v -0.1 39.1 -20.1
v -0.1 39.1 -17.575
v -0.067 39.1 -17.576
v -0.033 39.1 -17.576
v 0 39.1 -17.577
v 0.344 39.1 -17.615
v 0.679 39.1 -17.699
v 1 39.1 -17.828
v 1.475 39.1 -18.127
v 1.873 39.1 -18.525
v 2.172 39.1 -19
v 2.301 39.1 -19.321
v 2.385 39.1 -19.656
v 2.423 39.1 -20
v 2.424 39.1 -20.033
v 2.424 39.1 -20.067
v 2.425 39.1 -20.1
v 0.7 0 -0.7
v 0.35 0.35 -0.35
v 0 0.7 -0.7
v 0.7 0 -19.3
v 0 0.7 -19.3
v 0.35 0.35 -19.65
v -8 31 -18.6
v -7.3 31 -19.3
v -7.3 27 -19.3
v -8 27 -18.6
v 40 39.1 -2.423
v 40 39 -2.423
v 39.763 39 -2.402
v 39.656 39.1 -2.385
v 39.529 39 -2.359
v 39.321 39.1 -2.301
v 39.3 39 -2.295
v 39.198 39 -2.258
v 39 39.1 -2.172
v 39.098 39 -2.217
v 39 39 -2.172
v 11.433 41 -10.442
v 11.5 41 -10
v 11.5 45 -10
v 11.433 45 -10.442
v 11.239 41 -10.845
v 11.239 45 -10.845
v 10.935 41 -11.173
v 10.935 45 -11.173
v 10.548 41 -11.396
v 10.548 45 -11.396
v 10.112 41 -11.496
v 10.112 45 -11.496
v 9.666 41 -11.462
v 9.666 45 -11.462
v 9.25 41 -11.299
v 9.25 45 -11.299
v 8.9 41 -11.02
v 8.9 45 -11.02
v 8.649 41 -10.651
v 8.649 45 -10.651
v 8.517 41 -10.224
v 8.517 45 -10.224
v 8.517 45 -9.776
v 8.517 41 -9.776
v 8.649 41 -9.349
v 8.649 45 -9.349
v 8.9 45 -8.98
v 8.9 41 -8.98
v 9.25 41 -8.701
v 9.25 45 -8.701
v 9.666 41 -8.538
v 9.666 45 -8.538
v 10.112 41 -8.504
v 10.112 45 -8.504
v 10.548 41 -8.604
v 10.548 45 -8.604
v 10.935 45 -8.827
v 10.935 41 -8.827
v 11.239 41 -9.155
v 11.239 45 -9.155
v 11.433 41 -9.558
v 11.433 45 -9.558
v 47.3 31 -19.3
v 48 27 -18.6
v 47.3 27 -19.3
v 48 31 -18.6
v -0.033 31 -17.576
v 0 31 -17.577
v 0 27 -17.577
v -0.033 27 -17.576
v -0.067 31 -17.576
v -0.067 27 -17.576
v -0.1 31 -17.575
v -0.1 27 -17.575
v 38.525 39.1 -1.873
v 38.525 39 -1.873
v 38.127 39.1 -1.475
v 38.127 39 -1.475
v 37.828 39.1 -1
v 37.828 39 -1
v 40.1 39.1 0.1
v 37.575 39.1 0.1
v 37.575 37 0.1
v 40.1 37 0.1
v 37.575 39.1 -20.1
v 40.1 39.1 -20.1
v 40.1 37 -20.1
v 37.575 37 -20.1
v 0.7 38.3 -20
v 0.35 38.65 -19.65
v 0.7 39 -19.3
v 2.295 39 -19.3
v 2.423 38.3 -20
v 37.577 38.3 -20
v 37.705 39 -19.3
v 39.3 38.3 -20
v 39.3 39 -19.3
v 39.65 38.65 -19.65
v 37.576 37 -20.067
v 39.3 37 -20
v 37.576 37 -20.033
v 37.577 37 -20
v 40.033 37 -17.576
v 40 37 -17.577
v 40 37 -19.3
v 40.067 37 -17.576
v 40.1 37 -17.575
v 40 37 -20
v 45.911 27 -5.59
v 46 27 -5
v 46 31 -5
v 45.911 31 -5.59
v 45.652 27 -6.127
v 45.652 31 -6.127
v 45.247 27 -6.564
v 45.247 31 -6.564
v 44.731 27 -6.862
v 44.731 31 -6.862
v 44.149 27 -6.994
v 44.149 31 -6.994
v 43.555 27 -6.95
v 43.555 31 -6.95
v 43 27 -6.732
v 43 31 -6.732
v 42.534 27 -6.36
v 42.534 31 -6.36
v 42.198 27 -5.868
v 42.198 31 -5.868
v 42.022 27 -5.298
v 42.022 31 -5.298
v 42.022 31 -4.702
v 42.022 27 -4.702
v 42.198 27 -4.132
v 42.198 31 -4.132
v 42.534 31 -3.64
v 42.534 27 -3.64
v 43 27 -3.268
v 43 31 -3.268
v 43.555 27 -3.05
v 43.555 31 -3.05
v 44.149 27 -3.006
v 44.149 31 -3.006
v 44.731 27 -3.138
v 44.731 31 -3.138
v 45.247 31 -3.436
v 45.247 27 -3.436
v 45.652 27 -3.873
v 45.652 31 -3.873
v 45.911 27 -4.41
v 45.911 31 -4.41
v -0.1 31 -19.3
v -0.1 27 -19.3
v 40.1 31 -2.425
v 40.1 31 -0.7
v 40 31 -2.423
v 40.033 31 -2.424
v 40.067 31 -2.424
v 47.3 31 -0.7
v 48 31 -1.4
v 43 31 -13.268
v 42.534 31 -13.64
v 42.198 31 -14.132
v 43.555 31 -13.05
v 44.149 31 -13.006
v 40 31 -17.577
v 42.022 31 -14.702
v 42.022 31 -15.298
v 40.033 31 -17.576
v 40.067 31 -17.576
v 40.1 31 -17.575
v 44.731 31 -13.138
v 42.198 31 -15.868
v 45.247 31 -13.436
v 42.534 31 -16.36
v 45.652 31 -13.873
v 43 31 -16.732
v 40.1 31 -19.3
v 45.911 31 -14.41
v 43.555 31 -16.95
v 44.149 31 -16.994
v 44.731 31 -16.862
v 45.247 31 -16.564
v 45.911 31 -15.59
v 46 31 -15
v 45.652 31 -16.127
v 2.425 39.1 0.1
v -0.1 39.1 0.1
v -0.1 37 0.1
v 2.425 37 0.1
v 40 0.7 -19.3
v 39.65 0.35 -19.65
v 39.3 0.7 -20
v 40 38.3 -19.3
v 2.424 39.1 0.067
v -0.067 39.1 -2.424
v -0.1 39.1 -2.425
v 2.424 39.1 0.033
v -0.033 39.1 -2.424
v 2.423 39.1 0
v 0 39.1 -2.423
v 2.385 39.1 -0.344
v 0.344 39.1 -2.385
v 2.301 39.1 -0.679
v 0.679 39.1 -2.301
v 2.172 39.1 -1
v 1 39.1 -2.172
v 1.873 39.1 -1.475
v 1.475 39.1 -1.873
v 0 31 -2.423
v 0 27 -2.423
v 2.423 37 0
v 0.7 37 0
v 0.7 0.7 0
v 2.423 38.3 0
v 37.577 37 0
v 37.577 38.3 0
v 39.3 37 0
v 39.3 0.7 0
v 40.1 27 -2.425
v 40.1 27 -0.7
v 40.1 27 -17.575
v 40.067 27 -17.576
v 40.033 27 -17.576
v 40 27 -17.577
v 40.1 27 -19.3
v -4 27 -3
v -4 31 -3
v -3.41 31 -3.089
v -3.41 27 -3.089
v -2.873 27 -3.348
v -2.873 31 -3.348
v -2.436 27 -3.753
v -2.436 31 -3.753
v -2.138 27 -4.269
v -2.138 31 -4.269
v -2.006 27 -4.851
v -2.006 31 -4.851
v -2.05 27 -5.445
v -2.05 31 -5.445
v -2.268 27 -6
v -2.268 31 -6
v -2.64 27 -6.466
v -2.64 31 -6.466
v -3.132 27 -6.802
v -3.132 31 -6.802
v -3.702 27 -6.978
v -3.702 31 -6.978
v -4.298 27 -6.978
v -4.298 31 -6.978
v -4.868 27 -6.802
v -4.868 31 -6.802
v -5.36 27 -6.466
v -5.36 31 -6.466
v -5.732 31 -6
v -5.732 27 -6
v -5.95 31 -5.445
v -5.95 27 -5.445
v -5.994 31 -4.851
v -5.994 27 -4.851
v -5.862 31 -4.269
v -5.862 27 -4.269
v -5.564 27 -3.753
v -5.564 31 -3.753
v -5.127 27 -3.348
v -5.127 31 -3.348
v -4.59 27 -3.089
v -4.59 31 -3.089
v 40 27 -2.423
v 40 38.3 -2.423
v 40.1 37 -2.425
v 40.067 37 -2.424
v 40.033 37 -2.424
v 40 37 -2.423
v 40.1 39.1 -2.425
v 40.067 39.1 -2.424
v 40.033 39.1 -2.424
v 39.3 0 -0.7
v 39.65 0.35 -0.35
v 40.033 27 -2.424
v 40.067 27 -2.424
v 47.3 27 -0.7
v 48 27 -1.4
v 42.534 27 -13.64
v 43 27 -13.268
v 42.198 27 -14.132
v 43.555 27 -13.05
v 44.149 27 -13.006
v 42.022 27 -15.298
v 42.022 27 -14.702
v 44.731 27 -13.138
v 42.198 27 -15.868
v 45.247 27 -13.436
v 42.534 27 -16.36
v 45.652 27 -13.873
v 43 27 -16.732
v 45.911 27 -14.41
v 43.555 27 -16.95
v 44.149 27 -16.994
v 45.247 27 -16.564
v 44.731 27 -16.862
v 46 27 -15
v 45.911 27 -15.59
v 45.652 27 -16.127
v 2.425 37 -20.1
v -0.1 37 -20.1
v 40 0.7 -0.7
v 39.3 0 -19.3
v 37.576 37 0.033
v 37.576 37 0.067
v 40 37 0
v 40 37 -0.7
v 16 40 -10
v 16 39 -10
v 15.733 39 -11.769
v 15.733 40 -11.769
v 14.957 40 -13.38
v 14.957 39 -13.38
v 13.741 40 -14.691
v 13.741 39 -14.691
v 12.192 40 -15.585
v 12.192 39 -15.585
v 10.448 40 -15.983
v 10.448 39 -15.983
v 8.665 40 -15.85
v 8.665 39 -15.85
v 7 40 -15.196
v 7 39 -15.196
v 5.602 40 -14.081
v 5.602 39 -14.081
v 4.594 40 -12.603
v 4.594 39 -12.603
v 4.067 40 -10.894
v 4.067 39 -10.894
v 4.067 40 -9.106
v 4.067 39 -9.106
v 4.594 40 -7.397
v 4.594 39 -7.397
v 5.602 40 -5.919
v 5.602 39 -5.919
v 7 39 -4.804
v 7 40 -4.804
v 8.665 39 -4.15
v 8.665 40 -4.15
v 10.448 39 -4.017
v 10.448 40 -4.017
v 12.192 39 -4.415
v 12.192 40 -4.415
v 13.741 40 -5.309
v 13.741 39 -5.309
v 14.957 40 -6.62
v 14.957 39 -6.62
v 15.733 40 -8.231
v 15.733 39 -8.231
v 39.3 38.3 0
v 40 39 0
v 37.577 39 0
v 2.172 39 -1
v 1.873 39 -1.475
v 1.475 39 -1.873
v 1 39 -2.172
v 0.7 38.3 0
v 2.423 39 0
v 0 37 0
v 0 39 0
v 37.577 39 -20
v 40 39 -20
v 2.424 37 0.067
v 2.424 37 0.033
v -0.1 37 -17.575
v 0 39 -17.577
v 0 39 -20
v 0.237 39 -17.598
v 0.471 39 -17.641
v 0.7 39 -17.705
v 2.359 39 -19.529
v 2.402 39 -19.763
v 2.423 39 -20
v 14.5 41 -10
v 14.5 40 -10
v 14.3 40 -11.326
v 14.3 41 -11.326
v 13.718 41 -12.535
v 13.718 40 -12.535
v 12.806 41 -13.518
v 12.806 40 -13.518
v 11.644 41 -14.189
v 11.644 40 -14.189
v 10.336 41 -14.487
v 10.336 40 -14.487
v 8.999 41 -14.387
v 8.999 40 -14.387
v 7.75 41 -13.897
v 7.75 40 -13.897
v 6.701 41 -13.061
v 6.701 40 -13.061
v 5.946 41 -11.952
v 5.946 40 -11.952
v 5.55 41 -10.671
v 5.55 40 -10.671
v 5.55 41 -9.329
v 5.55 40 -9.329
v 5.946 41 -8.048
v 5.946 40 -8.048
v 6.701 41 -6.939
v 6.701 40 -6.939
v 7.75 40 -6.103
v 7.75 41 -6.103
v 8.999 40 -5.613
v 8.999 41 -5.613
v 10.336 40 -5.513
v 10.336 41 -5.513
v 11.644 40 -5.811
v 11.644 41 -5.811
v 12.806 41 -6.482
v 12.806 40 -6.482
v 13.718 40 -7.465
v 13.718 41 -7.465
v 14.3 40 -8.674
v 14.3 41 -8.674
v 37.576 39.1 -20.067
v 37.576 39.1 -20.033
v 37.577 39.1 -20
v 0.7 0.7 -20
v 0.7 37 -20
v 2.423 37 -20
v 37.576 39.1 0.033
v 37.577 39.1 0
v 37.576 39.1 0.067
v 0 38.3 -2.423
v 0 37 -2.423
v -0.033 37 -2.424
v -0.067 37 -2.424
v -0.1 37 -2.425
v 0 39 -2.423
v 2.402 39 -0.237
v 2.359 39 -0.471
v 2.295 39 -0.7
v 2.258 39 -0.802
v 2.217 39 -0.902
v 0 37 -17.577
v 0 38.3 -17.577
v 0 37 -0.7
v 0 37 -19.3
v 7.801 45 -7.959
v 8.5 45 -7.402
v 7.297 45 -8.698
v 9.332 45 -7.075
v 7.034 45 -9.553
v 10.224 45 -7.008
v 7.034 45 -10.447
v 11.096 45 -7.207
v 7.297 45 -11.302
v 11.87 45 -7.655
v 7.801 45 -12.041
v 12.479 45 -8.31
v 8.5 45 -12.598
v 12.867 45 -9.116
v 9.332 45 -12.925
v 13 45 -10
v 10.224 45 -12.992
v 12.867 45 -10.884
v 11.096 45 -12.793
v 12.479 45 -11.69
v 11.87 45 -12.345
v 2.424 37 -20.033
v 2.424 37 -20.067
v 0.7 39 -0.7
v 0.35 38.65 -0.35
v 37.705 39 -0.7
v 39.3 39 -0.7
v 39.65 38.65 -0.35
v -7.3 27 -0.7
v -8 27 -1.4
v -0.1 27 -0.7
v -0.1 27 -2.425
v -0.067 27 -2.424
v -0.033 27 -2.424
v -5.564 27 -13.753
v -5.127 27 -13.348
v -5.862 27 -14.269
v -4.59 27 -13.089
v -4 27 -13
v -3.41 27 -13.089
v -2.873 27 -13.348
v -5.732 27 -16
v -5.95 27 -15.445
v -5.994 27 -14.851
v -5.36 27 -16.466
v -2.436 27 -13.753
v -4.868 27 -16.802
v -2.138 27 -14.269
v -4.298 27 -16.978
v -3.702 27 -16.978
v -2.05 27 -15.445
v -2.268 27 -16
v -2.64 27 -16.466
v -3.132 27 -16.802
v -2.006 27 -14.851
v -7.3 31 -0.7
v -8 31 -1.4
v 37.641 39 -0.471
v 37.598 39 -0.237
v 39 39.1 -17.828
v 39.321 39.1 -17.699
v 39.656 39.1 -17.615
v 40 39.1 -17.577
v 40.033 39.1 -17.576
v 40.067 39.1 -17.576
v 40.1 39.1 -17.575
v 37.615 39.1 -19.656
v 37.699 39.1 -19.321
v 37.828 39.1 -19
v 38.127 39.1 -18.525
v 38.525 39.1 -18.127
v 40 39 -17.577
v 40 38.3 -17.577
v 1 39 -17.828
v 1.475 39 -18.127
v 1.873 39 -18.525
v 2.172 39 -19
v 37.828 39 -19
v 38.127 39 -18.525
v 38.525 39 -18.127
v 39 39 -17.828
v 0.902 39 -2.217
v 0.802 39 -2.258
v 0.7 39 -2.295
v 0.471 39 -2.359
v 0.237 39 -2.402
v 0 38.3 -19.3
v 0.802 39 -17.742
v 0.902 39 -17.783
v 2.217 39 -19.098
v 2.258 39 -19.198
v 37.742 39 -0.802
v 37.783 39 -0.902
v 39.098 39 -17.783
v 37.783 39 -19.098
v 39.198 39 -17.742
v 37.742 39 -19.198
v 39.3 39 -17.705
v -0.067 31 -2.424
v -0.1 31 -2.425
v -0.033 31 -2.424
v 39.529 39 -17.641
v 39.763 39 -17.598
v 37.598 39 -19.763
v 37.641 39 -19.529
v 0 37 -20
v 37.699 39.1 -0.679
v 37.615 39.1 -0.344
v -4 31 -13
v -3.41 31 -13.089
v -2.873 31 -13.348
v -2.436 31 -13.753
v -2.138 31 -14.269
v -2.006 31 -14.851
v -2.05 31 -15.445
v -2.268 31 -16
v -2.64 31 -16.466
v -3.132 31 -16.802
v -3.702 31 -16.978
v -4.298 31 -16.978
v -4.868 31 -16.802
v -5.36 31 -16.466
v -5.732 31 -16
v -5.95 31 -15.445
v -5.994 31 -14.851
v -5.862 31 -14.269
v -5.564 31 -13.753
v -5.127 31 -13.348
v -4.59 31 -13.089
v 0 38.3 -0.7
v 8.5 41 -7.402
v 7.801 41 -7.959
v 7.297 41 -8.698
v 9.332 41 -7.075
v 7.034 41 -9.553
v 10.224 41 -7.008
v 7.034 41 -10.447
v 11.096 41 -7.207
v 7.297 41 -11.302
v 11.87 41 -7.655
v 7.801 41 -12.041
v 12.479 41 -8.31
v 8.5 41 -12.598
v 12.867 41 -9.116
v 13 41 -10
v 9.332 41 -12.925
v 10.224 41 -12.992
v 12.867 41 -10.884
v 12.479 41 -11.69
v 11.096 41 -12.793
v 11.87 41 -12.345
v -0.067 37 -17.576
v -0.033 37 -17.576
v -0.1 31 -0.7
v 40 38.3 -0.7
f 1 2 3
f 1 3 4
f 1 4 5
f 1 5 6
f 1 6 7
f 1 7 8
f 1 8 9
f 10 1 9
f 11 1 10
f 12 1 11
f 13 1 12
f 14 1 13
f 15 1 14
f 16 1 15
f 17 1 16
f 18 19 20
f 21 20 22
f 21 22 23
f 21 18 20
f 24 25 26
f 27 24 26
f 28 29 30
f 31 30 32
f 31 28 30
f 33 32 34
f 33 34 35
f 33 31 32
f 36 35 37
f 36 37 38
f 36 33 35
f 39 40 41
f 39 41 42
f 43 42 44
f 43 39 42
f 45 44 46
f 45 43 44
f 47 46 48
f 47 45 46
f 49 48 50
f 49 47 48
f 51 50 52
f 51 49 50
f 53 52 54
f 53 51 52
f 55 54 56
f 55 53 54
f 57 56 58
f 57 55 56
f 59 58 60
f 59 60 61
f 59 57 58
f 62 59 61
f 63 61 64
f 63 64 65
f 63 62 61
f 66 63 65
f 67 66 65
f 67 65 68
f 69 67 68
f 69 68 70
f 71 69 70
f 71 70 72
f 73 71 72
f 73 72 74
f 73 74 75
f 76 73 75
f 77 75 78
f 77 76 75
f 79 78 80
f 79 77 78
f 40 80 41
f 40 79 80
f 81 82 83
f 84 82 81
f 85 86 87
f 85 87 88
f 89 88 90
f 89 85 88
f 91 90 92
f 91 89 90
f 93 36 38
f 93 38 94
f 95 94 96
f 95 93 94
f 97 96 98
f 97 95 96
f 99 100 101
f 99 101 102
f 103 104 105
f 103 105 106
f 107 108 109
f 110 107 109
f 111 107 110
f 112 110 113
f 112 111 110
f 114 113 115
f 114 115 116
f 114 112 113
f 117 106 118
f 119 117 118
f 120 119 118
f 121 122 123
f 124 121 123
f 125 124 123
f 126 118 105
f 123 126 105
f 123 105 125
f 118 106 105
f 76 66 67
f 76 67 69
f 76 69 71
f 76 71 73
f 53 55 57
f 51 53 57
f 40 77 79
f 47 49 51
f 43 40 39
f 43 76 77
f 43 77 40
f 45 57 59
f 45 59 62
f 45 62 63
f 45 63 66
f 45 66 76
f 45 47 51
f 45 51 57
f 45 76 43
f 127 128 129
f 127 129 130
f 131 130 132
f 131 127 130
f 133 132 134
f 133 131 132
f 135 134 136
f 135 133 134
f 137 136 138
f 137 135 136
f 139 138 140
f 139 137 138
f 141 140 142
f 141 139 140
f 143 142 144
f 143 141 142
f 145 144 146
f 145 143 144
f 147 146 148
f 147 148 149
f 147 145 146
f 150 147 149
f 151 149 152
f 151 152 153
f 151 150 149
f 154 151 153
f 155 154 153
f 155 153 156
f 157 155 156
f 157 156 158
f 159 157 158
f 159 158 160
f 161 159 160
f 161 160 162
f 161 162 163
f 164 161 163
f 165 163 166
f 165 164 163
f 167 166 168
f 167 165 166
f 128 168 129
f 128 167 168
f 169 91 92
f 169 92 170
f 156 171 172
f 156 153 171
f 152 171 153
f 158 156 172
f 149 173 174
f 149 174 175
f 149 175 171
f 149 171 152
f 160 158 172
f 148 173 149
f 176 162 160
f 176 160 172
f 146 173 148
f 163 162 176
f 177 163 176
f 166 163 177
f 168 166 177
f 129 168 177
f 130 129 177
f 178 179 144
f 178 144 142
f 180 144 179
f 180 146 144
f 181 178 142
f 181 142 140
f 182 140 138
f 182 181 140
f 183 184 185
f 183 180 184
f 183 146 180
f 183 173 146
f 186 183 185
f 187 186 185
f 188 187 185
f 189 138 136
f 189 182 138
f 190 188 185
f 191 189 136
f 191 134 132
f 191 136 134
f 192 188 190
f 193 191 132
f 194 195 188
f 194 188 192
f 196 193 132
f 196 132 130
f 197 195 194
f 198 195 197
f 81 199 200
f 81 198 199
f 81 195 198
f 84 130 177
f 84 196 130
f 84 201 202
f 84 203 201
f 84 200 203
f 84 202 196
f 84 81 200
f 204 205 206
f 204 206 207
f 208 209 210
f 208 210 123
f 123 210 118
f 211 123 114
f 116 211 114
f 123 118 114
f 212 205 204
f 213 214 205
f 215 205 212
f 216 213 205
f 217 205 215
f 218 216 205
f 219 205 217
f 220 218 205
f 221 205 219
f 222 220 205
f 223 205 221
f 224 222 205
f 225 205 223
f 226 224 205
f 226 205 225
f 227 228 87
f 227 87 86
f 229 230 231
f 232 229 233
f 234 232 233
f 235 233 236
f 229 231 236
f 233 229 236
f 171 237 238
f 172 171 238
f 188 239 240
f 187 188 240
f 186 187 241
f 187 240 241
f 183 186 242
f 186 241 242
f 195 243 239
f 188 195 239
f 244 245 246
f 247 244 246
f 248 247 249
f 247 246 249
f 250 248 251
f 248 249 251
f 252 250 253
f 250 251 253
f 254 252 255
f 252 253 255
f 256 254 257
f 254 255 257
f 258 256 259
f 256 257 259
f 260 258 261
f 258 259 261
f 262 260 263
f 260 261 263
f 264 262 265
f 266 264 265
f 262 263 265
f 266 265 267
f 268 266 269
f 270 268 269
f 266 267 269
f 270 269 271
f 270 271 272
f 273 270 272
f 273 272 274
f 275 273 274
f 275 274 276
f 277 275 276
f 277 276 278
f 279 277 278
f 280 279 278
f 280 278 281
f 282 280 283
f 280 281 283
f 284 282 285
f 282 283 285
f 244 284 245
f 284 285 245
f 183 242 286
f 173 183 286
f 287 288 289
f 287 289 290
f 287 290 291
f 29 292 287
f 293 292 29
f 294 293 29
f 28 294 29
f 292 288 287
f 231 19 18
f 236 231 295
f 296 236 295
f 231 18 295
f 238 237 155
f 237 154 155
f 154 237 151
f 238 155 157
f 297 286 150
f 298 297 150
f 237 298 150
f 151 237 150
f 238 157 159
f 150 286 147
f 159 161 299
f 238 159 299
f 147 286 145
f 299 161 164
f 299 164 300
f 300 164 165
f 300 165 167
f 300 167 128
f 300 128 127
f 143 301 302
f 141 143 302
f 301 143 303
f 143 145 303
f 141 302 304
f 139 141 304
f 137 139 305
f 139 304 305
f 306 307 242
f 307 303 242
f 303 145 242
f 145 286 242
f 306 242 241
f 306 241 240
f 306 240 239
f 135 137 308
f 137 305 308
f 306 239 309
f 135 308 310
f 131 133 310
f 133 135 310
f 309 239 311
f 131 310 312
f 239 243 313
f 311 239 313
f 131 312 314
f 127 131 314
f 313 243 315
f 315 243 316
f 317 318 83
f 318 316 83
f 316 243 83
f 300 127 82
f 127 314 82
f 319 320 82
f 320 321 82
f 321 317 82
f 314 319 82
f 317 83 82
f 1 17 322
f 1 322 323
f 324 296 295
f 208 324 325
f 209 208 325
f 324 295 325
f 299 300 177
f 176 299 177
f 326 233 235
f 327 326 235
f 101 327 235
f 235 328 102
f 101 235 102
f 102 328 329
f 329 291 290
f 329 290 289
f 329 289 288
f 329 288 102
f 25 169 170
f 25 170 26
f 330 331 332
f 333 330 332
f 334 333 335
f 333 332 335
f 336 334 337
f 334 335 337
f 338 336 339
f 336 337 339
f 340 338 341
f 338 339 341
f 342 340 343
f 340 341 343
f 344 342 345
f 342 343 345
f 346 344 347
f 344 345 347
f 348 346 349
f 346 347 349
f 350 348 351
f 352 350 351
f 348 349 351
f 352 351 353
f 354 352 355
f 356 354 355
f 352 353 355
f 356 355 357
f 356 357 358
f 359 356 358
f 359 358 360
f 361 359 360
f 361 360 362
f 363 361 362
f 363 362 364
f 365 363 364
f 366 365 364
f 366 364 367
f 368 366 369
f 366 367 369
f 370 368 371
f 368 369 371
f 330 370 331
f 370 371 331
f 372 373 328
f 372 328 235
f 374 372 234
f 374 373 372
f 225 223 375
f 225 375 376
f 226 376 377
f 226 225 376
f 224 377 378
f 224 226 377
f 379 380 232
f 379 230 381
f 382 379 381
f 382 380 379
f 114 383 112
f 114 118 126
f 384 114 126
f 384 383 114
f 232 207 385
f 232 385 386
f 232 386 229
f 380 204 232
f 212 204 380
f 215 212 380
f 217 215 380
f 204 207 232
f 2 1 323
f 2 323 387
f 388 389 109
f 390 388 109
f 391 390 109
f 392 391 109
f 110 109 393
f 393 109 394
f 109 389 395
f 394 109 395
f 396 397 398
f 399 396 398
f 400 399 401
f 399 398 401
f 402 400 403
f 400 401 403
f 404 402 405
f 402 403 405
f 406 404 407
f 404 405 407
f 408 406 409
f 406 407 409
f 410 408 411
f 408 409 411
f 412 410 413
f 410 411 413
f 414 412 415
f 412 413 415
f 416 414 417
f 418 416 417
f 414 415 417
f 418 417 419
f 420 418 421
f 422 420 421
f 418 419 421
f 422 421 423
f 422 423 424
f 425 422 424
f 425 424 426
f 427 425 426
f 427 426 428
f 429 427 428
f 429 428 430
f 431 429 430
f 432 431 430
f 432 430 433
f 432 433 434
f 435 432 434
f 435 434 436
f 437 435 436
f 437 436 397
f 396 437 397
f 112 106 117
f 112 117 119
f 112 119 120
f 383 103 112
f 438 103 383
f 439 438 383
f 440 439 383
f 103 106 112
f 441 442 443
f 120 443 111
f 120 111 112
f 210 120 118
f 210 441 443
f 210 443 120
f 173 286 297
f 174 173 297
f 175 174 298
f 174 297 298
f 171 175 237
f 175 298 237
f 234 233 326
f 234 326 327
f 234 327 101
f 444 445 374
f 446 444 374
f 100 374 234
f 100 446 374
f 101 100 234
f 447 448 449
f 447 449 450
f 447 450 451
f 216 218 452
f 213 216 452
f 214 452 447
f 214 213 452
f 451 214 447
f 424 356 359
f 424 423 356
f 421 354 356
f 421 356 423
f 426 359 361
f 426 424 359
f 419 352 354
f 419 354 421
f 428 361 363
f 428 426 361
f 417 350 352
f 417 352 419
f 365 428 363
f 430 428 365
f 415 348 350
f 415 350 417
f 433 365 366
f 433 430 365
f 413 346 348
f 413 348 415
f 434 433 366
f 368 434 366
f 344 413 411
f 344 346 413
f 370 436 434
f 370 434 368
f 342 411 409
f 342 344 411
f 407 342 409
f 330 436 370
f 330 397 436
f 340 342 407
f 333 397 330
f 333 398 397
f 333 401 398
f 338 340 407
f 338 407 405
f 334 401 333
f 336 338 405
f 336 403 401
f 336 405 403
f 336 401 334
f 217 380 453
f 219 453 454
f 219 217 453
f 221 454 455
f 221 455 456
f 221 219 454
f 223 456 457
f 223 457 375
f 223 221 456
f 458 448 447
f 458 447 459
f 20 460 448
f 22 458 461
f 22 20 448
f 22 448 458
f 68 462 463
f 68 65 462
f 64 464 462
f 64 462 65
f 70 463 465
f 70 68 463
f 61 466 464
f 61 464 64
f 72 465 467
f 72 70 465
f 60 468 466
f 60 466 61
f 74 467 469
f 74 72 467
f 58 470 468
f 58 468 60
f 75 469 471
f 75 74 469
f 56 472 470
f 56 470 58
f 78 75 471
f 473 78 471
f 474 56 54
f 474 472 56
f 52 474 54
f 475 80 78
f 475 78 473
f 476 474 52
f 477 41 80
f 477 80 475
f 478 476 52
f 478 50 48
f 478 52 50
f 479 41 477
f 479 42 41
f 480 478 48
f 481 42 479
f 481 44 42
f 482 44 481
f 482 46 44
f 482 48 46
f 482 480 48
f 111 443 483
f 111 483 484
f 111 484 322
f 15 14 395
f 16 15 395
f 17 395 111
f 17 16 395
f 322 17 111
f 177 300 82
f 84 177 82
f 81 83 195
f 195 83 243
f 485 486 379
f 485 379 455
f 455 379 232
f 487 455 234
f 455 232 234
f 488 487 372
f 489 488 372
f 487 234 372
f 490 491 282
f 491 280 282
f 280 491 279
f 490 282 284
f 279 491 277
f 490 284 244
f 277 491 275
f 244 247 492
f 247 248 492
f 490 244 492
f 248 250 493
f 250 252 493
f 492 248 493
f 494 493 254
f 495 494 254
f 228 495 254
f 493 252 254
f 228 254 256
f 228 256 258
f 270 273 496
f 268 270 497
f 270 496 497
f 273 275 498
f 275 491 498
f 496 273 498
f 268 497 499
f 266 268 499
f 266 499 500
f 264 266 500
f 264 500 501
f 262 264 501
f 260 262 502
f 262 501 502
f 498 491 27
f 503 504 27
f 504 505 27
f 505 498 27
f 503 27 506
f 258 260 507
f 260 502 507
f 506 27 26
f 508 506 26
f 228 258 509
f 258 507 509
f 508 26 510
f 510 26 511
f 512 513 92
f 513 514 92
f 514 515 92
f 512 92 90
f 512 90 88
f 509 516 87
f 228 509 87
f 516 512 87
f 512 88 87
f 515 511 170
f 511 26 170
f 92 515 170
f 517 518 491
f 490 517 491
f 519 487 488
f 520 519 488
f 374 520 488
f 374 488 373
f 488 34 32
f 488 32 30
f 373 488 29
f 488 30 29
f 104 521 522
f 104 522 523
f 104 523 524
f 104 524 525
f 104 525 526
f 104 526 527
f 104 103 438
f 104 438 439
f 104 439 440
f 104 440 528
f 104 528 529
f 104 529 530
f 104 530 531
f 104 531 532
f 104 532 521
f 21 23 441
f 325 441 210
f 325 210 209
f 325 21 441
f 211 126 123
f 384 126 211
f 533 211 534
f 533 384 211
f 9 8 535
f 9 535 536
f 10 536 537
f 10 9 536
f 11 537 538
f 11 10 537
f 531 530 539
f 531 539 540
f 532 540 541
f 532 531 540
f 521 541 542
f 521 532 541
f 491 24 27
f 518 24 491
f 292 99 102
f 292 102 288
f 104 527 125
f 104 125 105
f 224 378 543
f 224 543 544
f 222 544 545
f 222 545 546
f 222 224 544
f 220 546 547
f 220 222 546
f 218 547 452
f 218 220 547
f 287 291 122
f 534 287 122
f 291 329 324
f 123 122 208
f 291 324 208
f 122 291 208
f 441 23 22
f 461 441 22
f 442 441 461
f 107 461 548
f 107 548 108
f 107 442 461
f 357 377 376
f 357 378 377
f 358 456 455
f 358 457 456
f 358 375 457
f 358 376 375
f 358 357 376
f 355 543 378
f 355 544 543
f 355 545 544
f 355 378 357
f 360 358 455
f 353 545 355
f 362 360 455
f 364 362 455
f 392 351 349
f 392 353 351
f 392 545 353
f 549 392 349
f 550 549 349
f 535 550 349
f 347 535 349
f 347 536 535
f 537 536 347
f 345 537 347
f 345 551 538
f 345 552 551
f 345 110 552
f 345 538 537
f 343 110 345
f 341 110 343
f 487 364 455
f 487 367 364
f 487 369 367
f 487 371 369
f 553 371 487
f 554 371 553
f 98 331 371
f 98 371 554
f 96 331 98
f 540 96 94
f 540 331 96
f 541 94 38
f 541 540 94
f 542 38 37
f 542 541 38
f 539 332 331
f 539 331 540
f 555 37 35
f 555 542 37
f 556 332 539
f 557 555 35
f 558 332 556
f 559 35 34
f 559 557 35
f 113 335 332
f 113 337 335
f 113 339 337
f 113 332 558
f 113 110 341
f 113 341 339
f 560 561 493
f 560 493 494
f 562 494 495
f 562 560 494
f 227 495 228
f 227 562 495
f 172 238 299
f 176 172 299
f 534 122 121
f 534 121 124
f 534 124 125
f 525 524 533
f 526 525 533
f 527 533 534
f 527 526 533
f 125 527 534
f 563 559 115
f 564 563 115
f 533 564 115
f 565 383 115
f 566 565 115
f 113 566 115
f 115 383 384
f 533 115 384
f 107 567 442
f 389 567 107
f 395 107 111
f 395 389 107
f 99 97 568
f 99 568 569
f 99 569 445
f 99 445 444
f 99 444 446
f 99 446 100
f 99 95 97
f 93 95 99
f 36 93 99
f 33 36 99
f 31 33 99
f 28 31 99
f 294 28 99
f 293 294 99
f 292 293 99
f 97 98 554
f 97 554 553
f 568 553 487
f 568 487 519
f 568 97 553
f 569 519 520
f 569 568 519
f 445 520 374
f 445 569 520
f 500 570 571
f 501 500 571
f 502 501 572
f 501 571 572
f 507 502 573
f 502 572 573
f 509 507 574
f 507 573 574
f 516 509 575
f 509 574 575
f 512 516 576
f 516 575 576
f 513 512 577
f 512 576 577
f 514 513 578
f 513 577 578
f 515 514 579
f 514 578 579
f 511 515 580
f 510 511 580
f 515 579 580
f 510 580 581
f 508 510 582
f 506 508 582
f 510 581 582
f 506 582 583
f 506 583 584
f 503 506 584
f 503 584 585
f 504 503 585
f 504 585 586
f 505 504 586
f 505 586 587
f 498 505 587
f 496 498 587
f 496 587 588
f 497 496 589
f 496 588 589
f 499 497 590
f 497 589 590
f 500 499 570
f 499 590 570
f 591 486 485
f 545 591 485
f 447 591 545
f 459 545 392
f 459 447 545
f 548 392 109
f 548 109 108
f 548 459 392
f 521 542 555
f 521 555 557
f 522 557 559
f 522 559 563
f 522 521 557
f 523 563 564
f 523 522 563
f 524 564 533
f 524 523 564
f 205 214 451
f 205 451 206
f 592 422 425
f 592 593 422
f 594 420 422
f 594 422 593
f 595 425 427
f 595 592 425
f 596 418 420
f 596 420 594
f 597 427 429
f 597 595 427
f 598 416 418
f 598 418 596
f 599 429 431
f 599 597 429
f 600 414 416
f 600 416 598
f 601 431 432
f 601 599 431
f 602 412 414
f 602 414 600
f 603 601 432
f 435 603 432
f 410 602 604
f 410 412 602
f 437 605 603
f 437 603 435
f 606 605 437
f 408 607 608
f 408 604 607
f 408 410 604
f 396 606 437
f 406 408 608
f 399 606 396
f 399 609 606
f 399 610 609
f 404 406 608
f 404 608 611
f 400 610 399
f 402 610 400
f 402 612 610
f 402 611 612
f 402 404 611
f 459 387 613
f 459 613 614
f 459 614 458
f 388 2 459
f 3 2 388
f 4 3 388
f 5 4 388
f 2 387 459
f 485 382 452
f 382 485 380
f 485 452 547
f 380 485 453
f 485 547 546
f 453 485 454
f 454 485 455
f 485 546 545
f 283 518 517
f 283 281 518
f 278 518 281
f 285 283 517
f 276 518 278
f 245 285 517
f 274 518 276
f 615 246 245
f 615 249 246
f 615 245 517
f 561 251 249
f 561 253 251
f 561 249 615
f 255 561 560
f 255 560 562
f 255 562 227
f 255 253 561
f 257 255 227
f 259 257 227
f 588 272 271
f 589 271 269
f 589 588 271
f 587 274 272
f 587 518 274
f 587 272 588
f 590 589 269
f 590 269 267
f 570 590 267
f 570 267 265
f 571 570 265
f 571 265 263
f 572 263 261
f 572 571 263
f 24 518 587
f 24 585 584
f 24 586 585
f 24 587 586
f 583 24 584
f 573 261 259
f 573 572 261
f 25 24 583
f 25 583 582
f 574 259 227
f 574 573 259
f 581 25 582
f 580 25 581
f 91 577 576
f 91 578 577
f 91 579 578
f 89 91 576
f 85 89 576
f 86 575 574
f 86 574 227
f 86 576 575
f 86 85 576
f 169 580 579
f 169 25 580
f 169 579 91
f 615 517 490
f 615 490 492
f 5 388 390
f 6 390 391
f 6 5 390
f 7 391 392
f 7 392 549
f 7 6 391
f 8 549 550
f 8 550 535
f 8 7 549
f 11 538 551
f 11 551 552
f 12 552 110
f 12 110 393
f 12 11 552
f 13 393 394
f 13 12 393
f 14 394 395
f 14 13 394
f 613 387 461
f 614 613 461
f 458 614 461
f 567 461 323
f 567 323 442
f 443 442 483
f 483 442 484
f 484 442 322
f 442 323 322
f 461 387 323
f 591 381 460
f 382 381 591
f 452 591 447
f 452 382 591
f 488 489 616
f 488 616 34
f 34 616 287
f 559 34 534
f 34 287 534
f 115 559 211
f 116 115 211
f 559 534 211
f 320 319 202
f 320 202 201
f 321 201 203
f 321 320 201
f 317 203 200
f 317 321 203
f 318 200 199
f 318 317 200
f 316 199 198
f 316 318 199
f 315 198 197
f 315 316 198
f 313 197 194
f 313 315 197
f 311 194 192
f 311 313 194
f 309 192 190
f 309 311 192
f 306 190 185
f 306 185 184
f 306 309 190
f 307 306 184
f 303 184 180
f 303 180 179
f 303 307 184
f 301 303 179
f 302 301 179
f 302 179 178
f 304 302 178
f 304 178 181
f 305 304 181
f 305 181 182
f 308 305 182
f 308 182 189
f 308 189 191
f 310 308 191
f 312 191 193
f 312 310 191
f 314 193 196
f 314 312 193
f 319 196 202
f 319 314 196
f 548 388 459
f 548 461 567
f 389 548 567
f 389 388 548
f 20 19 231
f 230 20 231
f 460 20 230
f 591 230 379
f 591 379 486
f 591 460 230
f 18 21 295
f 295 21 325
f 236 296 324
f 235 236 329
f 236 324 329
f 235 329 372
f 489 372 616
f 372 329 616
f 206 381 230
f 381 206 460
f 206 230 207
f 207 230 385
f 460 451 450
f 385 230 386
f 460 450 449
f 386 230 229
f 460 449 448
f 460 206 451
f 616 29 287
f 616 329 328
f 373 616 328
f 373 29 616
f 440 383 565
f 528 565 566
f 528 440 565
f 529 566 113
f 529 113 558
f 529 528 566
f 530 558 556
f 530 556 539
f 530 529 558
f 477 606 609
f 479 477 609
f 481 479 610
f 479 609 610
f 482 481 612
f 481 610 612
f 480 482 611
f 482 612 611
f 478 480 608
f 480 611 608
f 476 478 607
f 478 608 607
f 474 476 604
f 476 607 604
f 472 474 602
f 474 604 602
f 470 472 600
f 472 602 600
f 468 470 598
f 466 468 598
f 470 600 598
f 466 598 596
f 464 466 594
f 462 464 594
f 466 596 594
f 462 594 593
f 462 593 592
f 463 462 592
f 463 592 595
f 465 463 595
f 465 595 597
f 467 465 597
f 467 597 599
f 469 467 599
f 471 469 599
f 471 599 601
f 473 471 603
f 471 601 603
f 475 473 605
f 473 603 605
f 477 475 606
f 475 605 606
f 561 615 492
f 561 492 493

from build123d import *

# Parameters (mm, degrees)
SKETCH_1_W                   = 40
SKETCH_1_H                   = 20
EXTRUDE_1_DEPTH              = 39
EXTRUDE_START                = 31
SKETCH_1_6_R                 = 2
EXTRUDE_2_DEPTH              = 4
EXTRUDE_START_2              = 39
SKETCH_1_9_R                 = 3
EXTRUDE_3_DEPTH              = 6
SKETCH_1_10_R                = 6
EXTRUDE_4_DEPTH              = 1
EXTRUDE_START_3              = 40
SKETCH_1_13_R                = 4.5
EXTRUDE_5_DEPTH              = 1
CUT_EXTRUDE_START            = 45
SKETCH_1_16_R                = 1.5
CUT_EXTRUDE_1_DEPTH          = 4
SPLIT_BODIES_1_OUTLINE_W     = 40
SPLIT_BODIES_1_OUTLINE_H     = 20
SPLIT_BODIES_1_DEPTH         = 39
SPLIT_START                  = 39
SPLIT_BODIES_1_2_OUTLINE_R   = 4.5
SPLIT_BODIES_1_2_DEPTH       = 2
SPLIT_START_2                = 41
SPLIT_BODIES_1_3_OUTLINE_R   = 3
SPLIT_BODIES_1_3_OUTLINE_R_2 = 1.5
SPLIT_BODIES_1_3_DEPTH       = 4
SPLIT_BODIES_1_4_OUTLINE_R   = 6
SPLIT_BODIES_1_4_OUTLINE_R_2 = 4.5
SPLIT_BODIES_1_4_DEPTH       = 1
SPLIT_BODIES_1_5_OUTLINE_W   = 46
SPLIT_BODIES_1_5_OUTLINE_H   = 22
SPLIT_BODIES_1_5_DEPTH       = 48
SPLIT_START_3                = 27
SPLIT_BODIES_1_6_OUTLINE_R   = 2
SPLIT_BODIES_1_6_DEPTH       = 4
CHAMFER_9_SIZE               = 0.7
CHAMFER_10_SIZE              = 0.7
CHAMFER_11_SIZE              = 0.7
CHAMFER_12_SIZE              = 0.7
EXTRUDE_START_4              = 39.1
EXTRUDE_6_DEPTH              = 0.1
EXTRUDE_7_DEPTH              = 2


# Read off the part's stored shape, not the designer's step: 分割1
with BuildPart() as part:
    # 草图1 → 凸台-拉伸1 (new body)
    with BuildSketch(Plane(origin=(0, 0, 0), x_dir=(1, 0, 0), z_dir=(0, 1, 0))):
        with Locations((20, 10)):
            Rectangle(SKETCH_1_W, SKETCH_1_H)
    extrude(amount=EXTRUDE_1_DEPTH)

    # 草图1<6> → 凸台-拉伸2 (add)
    # profile 1 of 2: a face of its own
    with BuildSketch(Plane(origin=(0, 0, 0), x_dir=(1, 0, 0), z_dir=(0, 1, 0)).offset(EXTRUDE_START)):
        with BuildLine():
            ThreePointArc((-0.1, 2.424701022), (-0.049990188, 2.424205671), (0, 2.422719812))
            Line((0, 2.422719812), (0, 17.577280188))
            ThreePointArc((0, 17.577280188), (-0.049990188, 17.575794329), (-0.1, 17.575298978))
            Line((-0.1, 17.575298978), (-0.1, 19.3))
            Line((-0.1, 19.3), (-8, 19.3))
            Line((-8, 19.3), (-8, 0.7))
            Line((-8, 0.7), (-0.1, 0.7))
            Line((-0.1, 0.7), (-0.1, 2.424701022))
        make_face()
        with Locations(Location((-4, 5, 0), (0, 0, 270))):
            Circle(SKETCH_1_6_R, mode=Mode.SUBTRACT)
        with Locations(Location((-4, 15, 0), (0, 0, 270))):
            Circle(SKETCH_1_6_R, mode=Mode.SUBTRACT)
    # profile 2 of 2: a face of its own
    with BuildSketch(Plane(origin=(0, 0, 0), x_dir=(1, 0, 0), z_dir=(0, 1, 0)).offset(EXTRUDE_START)):
        with BuildLine():
            Line((40, 17.577280188), (40, 2.422719812))
            ThreePointArc((40, 2.422719812), (40.049990188, 2.424205671), (40.1, 2.424701022))
            Line((40.1, 2.424701022), (40.1, 0.7))
            Line((40.1, 0.7), (48, 0.7))
            Line((48, 0.7), (48, 19.3))
            Line((48, 19.3), (40.1, 19.3))
            Line((40.1, 19.3), (40.1, 17.575298978))
            ThreePointArc((40.1, 17.575298978), (40.049990188, 17.575794329), (40, 17.577280188))
        make_face()
        with Locations(Location((44, 5, 0), (0, 0, 270))):
            Circle(SKETCH_1_6_R, mode=Mode.SUBTRACT)
        with Locations(Location((44, 15, 0), (0, 0, 270))):
            Circle(SKETCH_1_6_R, mode=Mode.SUBTRACT)
    extrude(amount=-EXTRUDE_2_DEPTH)

    # 草图1<9> → 凸台-拉伸3 (add)
    with BuildSketch(Plane(origin=(0, 0, 0), x_dir=(1, 0, 0), z_dir=(0, 1, 0)).offset(EXTRUDE_START_2)):
        with Locations(Location((10, 10, 0), (0, 0, 270))):
            Circle(SKETCH_1_9_R)
    extrude(amount=EXTRUDE_3_DEPTH)

    # 草图1<10> → 凸台-拉伸4 (add)
    with BuildSketch(Plane(origin=(0, 0, 0), x_dir=(1, 0, 0), z_dir=(0, 1, 0)).offset(EXTRUDE_START_2)):
        with Locations(Location((10, 10, 0), (0, 0, 270))):
            Circle(SKETCH_1_10_R)
    extrude(amount=EXTRUDE_4_DEPTH)

    # 草图1<13> → 凸台-拉伸5 (add)
    with BuildSketch(Plane(origin=(0, 0, 0), x_dir=(1, 0, 0), z_dir=(0, 1, 0)).offset(EXTRUDE_START_3)):
        with Locations(Location((10, 10, 0), (0, 0, 270))):
            Circle(SKETCH_1_13_R)
    extrude(amount=EXTRUDE_5_DEPTH)

    # 草图1<16> → 切除-拉伸1 (cut)
    with BuildSketch(Plane(origin=(0, 0, 0), x_dir=(1, 0, 0), z_dir=(0, 1, 0)).offset(CUT_EXTRUDE_START)):
        with Locations(Location((10, 10, 0), (0, 0, 270))):
            Circle(SKETCH_1_16_R)
    extrude(amount=-CUT_EXTRUDE_1_DEPTH, mode=Mode.SUBTRACT)

    # Split Bodies 1 5 outline → Split Bodies 1 5 (cut)
    with BuildSketch(Plane.YZ):
        with Locations((22, -10)):
            Rectangle(SPLIT_BODIES_1_5_OUTLINE_W, SPLIT_BODIES_1_5_OUTLINE_H)
    extrude(amount=SPLIT_BODIES_1_5_DEPTH, mode=Mode.SUBTRACT)

    # 倒角10
    chamfer_10_edges = [part.edges().sort_by_distance(p)[0] for p in [
        (-8, 29, -19.3),
        (-8, 29, -0.7),
    ]]
    chamfer(chamfer_10_edges, length=CHAMFER_10_SIZE)


with BuildPart() as body_2:
    # Split Bodies 1 outline → Split Bodies 1 (new body)
    with BuildSketch(Plane(origin=(0, 0, 0), x_dir=(1, 0, 0), z_dir=(0, 1, 0))):
        with Locations((20, 10)):
            Rectangle(SPLIT_BODIES_1_OUTLINE_W, SPLIT_BODIES_1_OUTLINE_H)
    extrude(amount=SPLIT_BODIES_1_DEPTH)

    # Split Bodies 1 2 outline → Split Bodies 1 2 (add)
    with BuildSketch(Plane(origin=(0, 0, 0), x_dir=(1, 0, 0), z_dir=(0, 1, 0)).offset(SPLIT_START)):
        with Locations((10, 10)):
            Circle(SPLIT_BODIES_1_2_OUTLINE_R)
    extrude(amount=SPLIT_BODIES_1_2_DEPTH)

    # Split Bodies 1 3 outline → Split Bodies 1 3 (add)
    with BuildSketch(Plane(origin=(0, 0, 0), x_dir=(1, 0, 0), z_dir=(0, 1, 0)).offset(SPLIT_START_2)):
        with Locations((10, 10)):
            Circle(SPLIT_BODIES_1_3_OUTLINE_R)
        with Locations((10, 10)):
            Circle(SPLIT_BODIES_1_3_OUTLINE_R_2, mode=Mode.SUBTRACT)
    extrude(amount=SPLIT_BODIES_1_3_DEPTH)

    # Split Bodies 1 4 outline → Split Bodies 1 4 (add)
    with BuildSketch(Plane(origin=(0, 0, 0), x_dir=(1, 0, 0), z_dir=(0, 1, 0)).offset(SPLIT_START)):
        with Locations((10, 10)):
            Circle(SPLIT_BODIES_1_4_OUTLINE_R)
        with Locations((10, 10)):
            Circle(SPLIT_BODIES_1_4_OUTLINE_R_2, mode=Mode.SUBTRACT)
    extrude(amount=SPLIT_BODIES_1_4_DEPTH)

    # 倒角9
    chamfer_9_edges = [body_2.edges().sort_by_distance(p)[0] for p in [
        (20, 0, 0),
        (40, 0, -10),
        (20, 0, -20),
        (0, 0, -10),
        (20, 39, 0),
        (40, 39, -10),
        (20, 39, -20),
        (0, 39, -10),
    ]]
    chamfer(chamfer_9_edges, length=CHAMFER_9_SIZE)

    # 倒角12
    chamfer_12_edges = [body_2.edges().sort_by_distance(p)[0] for p in [
        (40, 19.5, -20),
        (40, 19.5, 0),
        (0, 19.5, 0),
        (0, 19.5, -20),
    ]]
    chamfer(chamfer_12_edges, length=CHAMFER_12_SIZE)

    # 草图1<26> → 凸台-拉伸6 (add)
    with BuildSketch(Plane(origin=(0, 0, 0), x_dir=(1, 0, 0), z_dir=(0, 1, 0)).offset(EXTRUDE_START_4)):
        Polygon((0, -0.1), (0, 0), (0, 0.7), (-0.1, 0.7), (-0.1, -0.1), align=None)
        with BuildLine():
            Line((0, 0.7), (0, 0))
            Line((0, 0), (2.422719812, 0))
            ThreePointArc((2.422719812, 0), (2.349175143, 0.512908125), (2.172468976, 1))
            Line((2.172468976, 1), (1, 1))
            Line((1, 1), (1, 2.172468976))
            ThreePointArc((1, 2.172468976), (0.512908125, 2.349175143), (0, 2.422719812))
            Line((0, 2.422719812), (0, 0.7))
        make_face()
        with BuildLine():
            Line((2.422719812, 0), (0, 0))
            Line((0, 0), (0, -0.1))
            Line((0, -0.1), (2.424701022, -0.1))
            ThreePointArc((2.424701022, -0.1), (2.424205671, -0.049990188), (2.422719812, 0))
        make_face()
        with BuildLine():
            Line((-0.1, 0.7), (0, 0.7))
            Line((0, 0.7), (0, 2.422719812))
            ThreePointArc((0, 2.422719812), (-0.049990188, 2.424205671), (-0.1, 2.424701022))
            Line((-0.1, 2.424701022), (-0.1, 0.7))
        make_face()
        with BuildLine():
            ThreePointArc((37.827531024, 1), (37.650824857, 0.512908125), (37.577280188, 0))
            Line((37.577280188, 0), (40, 0))
            Line((40, 0), (40, 0.7))
            Line((40, 0.7), (40, 2.422719812))
            ThreePointArc((40, 2.422719812), (39.487091875, 2.349175143), (39, 2.172468976))
            Line((39, 2.172468976), (39, 1))
            Line((39, 1), (37.827531024, 1))
        make_face()
        with BuildLine():
            Line((40, 0), (37.577280188, 0))
            ThreePointArc((37.577280188, 0), (37.575794329, -0.049990188), (37.575298978, -0.1))
            Line((37.575298978, -0.1), (40, -0.1))
            Line((40, -0.1), (40.1, -0.1))
            Line((40.1, -0.1), (40.1, 0.7))
            Line((40.1, 0.7), (40, 0.7))
            Line((40, 0.7), (40, 0))
        make_face()
        with BuildLine():
            Line((40, 2.422719812), (40, 0.7))
            Line((40, 0.7), (40.1, 0.7))
            Line((40.1, 0.7), (40.1, 2.424701022))
            ThreePointArc((40.1, 2.424701022), (40.049990188, 2.424205671), (40, 2.422719812))
        make_face()
        with BuildLine():
            ThreePointArc((-0.1, 17.575298978), (-0.049990188, 17.575794329), (0, 17.577280188))
            Line((0, 17.577280188), (0, 19.3))
            Line((0, 19.3), (-0.1, 19.3))
            Line((-0.1, 19.3), (-0.1, 17.575298978))
        make_face()
        with BuildLine():
            Line((-0.1, 19.3), (0, 19.3))
            Line((0, 19.3), (0, 20))
            Line((0, 20), (2.422719812, 20))
            ThreePointArc((2.422719812, 20), (2.424205671, 20.049990188), (2.424701022, 20.1))
            Line((2.424701022, 20.1), (0, 20.1))
            Line((0, 20.1), (-0.1, 20.1))
            Line((-0.1, 20.1), (-0.1, 19.3))
        make_face()
        with BuildLine():
            Line((0, 19.3), (0, 17.577280188))
            ThreePointArc((0, 17.577280188), (0.512908125, 17.650824857), (1, 17.827531024))
            Line((1, 17.827531024), (1, 19))
            Line((1, 19), (2.172468976, 19))
            ThreePointArc((2.172468976, 19), (2.349175143, 19.487091875), (2.422719812, 20))
            Line((2.422719812, 20), (0, 20))
            Line((0, 20), (0, 19.3))
        make_face()
        with BuildLine():
            Line((39, 19), (39, 17.827531024))
            ThreePointArc((39, 17.827531024), (39.487091875, 17.650824857), (40, 17.577280188))
            Line((40, 17.577280188), (40, 19.3))
            Line((40, 19.3), (40, 20))
            Line((40, 20), (37.577280188, 20))
            ThreePointArc((37.577280188, 20), (37.650824857, 19.487091875), (37.827531024, 19))
            Line((37.827531024, 19), (39, 19))
        make_face()
        with BuildLine():
            Line((40, 20), (40, 19.3))
            Line((40, 19.3), (40.1, 19.3))
            Line((40.1, 19.3), (40.1, 20.1))
            Line((40.1, 20.1), (40, 20.1))
            Line((40, 20.1), (37.575298978, 20.1))
            ThreePointArc((37.575298978, 20.1), (37.575794329, 20.049990188), (37.577280188, 20))
            Line((37.577280188, 20), (40, 20))
        make_face()
        with BuildLine():
            Line((40, 19.3), (40, 17.577280188))
            ThreePointArc((40, 17.577280188), (40.049990188, 17.575794329), (40.1, 17.575298978))
            Line((40.1, 17.575298978), (40.1, 19.3))
            Line((40.1, 19.3), (40, 19.3))
        make_face()
        with BuildLine():
            Line((1, 1), (2.172468976, 1))
            ThreePointArc((2.172468976, 1), (1.685233213, 1.685233213), (1, 2.172468976))
            Line((1, 2.172468976), (1, 1))
        make_face()
        with BuildLine():
            Line((1, 19), (1, 17.827531024))
            ThreePointArc((1, 17.827531024), (1.685233213, 18.314766787), (2.172468976, 19))
            Line((2.172468976, 19), (1, 19))
        make_face()
        with BuildLine():
            ThreePointArc((37.827531024, 19), (38.314766787, 18.314766787), (39, 17.827531024))
            Line((39, 17.827531024), (39, 19))
            Line((39, 19), (37.827531024, 19))
        make_face()
        with BuildLine():
            ThreePointArc((39, 2.172468976), (38.314766787, 1.685233213), (37.827531024, 1))
            Line((37.827531024, 1), (39, 1))
            Line((39, 1), (39, 2.172468976))
        make_face()
    extrude(amount=-EXTRUDE_6_DEPTH)

    # 草图1<27> → 凸台-拉伸7 (add)
    with BuildSketch(Plane(origin=(0, 0, 0), x_dir=(1, 0, 0), z_dir=(0, 1, 0)).offset(EXTRUDE_START_2)):
        with BuildLine():
            Line((-0.1, 19.3), (0, 19.3))
            Line((0, 19.3), (0, 20))
            Line((0, 20), (2.422719812, 20))
            ThreePointArc((2.422719812, 20), (2.424205671, 20.049990188), (2.424701022, 20.1))
            Line((2.424701022, 20.1), (0, 20.1))
            Line((0, 20.1), (-0.1, 20.1))
            Line((-0.1, 20.1), (-0.1, 19.3))
        make_face()
        with BuildLine():
            ThreePointArc((-0.1, 17.575298978), (-0.049990188, 17.575794329), (0, 17.577280188))
            Line((0, 17.577280188), (0, 19.3))
            Line((0, 19.3), (-0.1, 19.3))
            Line((-0.1, 19.3), (-0.1, 17.575298978))
        make_face()
        Polygon((0, -0.1), (0, 0), (0, 0.7), (-0.1, 0.7), (-0.1, -0.1), align=None)
        with BuildLine():
            Line((-0.1, 0.7), (0, 0.7))
            Line((0, 0.7), (0, 2.422719812))
            ThreePointArc((0, 2.422719812), (-0.049990188, 2.424205671), (-0.1, 2.424701022))
            Line((-0.1, 2.424701022), (-0.1, 0.7))
        make_face()
        with BuildLine():
            Line((2.422719812, 0), (0, 0))
            Line((0, 0), (0, -0.1))
            Line((0, -0.1), (2.424701022, -0.1))
            ThreePointArc((2.424701022, -0.1), (2.424205671, -0.049990188), (2.422719812, 0))
        make_face()
        with BuildLine():
            Line((40, 0), (37.577280188, 0))
            ThreePointArc((37.577280188, 0), (37.575794329, -0.049990188), (37.575298978, -0.1))
            Line((37.575298978, -0.1), (40, -0.1))
            Line((40, -0.1), (40.1, -0.1))
            Line((40.1, -0.1), (40.1, 0.7))
            Line((40.1, 0.7), (40, 0.7))
            Line((40, 0.7), (40, 0))
        make_face()
        with BuildLine():
            Line((40, 2.422719812), (40, 0.7))
            Line((40, 0.7), (40.1, 0.7))
            Line((40.1, 0.7), (40.1, 2.424701022))
            ThreePointArc((40.1, 2.424701022), (40.049990188, 2.424205671), (40, 2.422719812))
        make_face()
        with BuildLine():
            Line((40, 19.3), (40, 17.577280188))
            ThreePointArc((40, 17.577280188), (40.049990188, 17.575794329), (40.1, 17.575298978))
            Line((40.1, 17.575298978), (40.1, 19.3))
            Line((40.1, 19.3), (40, 19.3))
        make_face()
        with BuildLine():
            Line((40, 20), (40, 19.3))
            Line((40, 19.3), (40.1, 19.3))
            Line((40.1, 19.3), (40.1, 20.1))
            Line((40.1, 20.1), (40, 20.1))
            Line((40, 20.1), (37.575298978, 20.1))
            ThreePointArc((37.575298978, 20.1), (37.575794329, 20.049990188), (37.577280188, 20))
            Line((37.577280188, 20), (40, 20))
        make_face()
    extrude(amount=-EXTRUDE_7_DEPTH)


with BuildPart() as body_3:
    # Split Bodies 1 6 outline → Split Bodies 1 6 (new body)
    with BuildSketch(Plane(origin=(0, 0, 0), x_dir=(1, 0, 0), z_dir=(0, 1, 0)).offset(SPLIT_START_3)):
        with BuildLine():
            Line((40, 17.577280188), (40, 2.422719812))
            ThreePointArc((40, 2.422719812), (40.049990188, 2.424205671), (40.1, 2.424701022))
            Line((40.1, 2.424701022), (40.1, 0.7))
            Line((40.1, 0.7), (48, 0.7))
            Line((48, 0.7), (48, 19.3))
            Line((48, 19.3), (40.1, 19.3))
            Line((40.1, 19.3), (40.1, 17.575298978))
            ThreePointArc((40.1, 17.575298978), (40.049990188, 17.575794329), (40, 17.577280188))
        make_face()
        with Locations((44, 5)):
            Circle(SPLIT_BODIES_1_6_OUTLINE_R, mode=Mode.SUBTRACT)
        with Locations((44, 15)):
            Circle(SPLIT_BODIES_1_6_OUTLINE_R, mode=Mode.SUBTRACT)
    extrude(amount=SPLIT_BODIES_1_6_DEPTH)

    # 倒角11
    chamfer_11_edges = [body_3.edges().sort_by_distance(p)[0] for p in [
        (48, 29, -19.3),
        (48, 29, -0.7),
    ]]
    chamfer(chamfer_11_edges, length=CHAMFER_11_SIZE)


solid = Compound([part.part, body_2.part, body_3.part])
